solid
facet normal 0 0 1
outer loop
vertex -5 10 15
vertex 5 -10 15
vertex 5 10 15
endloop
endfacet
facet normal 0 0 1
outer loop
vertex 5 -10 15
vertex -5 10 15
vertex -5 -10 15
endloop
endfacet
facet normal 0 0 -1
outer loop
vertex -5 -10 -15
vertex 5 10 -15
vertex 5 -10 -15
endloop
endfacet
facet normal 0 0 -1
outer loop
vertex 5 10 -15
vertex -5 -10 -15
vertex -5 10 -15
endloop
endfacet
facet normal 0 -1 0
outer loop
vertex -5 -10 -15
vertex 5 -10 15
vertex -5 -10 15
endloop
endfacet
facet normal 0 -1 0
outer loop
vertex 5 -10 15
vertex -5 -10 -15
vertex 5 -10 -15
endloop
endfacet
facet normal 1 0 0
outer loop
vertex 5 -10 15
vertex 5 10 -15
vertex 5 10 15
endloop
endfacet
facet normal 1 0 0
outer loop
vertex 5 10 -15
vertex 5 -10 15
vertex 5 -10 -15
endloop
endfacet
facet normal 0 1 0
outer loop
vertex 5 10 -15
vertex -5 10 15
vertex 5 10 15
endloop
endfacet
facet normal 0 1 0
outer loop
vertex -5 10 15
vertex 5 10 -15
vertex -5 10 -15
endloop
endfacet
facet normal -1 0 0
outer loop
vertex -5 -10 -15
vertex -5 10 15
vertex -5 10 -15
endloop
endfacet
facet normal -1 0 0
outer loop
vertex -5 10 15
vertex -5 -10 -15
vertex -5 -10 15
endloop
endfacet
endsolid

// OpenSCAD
// Construct: cube() centered on the origin.
cube([10, 20, 30], center = true);
